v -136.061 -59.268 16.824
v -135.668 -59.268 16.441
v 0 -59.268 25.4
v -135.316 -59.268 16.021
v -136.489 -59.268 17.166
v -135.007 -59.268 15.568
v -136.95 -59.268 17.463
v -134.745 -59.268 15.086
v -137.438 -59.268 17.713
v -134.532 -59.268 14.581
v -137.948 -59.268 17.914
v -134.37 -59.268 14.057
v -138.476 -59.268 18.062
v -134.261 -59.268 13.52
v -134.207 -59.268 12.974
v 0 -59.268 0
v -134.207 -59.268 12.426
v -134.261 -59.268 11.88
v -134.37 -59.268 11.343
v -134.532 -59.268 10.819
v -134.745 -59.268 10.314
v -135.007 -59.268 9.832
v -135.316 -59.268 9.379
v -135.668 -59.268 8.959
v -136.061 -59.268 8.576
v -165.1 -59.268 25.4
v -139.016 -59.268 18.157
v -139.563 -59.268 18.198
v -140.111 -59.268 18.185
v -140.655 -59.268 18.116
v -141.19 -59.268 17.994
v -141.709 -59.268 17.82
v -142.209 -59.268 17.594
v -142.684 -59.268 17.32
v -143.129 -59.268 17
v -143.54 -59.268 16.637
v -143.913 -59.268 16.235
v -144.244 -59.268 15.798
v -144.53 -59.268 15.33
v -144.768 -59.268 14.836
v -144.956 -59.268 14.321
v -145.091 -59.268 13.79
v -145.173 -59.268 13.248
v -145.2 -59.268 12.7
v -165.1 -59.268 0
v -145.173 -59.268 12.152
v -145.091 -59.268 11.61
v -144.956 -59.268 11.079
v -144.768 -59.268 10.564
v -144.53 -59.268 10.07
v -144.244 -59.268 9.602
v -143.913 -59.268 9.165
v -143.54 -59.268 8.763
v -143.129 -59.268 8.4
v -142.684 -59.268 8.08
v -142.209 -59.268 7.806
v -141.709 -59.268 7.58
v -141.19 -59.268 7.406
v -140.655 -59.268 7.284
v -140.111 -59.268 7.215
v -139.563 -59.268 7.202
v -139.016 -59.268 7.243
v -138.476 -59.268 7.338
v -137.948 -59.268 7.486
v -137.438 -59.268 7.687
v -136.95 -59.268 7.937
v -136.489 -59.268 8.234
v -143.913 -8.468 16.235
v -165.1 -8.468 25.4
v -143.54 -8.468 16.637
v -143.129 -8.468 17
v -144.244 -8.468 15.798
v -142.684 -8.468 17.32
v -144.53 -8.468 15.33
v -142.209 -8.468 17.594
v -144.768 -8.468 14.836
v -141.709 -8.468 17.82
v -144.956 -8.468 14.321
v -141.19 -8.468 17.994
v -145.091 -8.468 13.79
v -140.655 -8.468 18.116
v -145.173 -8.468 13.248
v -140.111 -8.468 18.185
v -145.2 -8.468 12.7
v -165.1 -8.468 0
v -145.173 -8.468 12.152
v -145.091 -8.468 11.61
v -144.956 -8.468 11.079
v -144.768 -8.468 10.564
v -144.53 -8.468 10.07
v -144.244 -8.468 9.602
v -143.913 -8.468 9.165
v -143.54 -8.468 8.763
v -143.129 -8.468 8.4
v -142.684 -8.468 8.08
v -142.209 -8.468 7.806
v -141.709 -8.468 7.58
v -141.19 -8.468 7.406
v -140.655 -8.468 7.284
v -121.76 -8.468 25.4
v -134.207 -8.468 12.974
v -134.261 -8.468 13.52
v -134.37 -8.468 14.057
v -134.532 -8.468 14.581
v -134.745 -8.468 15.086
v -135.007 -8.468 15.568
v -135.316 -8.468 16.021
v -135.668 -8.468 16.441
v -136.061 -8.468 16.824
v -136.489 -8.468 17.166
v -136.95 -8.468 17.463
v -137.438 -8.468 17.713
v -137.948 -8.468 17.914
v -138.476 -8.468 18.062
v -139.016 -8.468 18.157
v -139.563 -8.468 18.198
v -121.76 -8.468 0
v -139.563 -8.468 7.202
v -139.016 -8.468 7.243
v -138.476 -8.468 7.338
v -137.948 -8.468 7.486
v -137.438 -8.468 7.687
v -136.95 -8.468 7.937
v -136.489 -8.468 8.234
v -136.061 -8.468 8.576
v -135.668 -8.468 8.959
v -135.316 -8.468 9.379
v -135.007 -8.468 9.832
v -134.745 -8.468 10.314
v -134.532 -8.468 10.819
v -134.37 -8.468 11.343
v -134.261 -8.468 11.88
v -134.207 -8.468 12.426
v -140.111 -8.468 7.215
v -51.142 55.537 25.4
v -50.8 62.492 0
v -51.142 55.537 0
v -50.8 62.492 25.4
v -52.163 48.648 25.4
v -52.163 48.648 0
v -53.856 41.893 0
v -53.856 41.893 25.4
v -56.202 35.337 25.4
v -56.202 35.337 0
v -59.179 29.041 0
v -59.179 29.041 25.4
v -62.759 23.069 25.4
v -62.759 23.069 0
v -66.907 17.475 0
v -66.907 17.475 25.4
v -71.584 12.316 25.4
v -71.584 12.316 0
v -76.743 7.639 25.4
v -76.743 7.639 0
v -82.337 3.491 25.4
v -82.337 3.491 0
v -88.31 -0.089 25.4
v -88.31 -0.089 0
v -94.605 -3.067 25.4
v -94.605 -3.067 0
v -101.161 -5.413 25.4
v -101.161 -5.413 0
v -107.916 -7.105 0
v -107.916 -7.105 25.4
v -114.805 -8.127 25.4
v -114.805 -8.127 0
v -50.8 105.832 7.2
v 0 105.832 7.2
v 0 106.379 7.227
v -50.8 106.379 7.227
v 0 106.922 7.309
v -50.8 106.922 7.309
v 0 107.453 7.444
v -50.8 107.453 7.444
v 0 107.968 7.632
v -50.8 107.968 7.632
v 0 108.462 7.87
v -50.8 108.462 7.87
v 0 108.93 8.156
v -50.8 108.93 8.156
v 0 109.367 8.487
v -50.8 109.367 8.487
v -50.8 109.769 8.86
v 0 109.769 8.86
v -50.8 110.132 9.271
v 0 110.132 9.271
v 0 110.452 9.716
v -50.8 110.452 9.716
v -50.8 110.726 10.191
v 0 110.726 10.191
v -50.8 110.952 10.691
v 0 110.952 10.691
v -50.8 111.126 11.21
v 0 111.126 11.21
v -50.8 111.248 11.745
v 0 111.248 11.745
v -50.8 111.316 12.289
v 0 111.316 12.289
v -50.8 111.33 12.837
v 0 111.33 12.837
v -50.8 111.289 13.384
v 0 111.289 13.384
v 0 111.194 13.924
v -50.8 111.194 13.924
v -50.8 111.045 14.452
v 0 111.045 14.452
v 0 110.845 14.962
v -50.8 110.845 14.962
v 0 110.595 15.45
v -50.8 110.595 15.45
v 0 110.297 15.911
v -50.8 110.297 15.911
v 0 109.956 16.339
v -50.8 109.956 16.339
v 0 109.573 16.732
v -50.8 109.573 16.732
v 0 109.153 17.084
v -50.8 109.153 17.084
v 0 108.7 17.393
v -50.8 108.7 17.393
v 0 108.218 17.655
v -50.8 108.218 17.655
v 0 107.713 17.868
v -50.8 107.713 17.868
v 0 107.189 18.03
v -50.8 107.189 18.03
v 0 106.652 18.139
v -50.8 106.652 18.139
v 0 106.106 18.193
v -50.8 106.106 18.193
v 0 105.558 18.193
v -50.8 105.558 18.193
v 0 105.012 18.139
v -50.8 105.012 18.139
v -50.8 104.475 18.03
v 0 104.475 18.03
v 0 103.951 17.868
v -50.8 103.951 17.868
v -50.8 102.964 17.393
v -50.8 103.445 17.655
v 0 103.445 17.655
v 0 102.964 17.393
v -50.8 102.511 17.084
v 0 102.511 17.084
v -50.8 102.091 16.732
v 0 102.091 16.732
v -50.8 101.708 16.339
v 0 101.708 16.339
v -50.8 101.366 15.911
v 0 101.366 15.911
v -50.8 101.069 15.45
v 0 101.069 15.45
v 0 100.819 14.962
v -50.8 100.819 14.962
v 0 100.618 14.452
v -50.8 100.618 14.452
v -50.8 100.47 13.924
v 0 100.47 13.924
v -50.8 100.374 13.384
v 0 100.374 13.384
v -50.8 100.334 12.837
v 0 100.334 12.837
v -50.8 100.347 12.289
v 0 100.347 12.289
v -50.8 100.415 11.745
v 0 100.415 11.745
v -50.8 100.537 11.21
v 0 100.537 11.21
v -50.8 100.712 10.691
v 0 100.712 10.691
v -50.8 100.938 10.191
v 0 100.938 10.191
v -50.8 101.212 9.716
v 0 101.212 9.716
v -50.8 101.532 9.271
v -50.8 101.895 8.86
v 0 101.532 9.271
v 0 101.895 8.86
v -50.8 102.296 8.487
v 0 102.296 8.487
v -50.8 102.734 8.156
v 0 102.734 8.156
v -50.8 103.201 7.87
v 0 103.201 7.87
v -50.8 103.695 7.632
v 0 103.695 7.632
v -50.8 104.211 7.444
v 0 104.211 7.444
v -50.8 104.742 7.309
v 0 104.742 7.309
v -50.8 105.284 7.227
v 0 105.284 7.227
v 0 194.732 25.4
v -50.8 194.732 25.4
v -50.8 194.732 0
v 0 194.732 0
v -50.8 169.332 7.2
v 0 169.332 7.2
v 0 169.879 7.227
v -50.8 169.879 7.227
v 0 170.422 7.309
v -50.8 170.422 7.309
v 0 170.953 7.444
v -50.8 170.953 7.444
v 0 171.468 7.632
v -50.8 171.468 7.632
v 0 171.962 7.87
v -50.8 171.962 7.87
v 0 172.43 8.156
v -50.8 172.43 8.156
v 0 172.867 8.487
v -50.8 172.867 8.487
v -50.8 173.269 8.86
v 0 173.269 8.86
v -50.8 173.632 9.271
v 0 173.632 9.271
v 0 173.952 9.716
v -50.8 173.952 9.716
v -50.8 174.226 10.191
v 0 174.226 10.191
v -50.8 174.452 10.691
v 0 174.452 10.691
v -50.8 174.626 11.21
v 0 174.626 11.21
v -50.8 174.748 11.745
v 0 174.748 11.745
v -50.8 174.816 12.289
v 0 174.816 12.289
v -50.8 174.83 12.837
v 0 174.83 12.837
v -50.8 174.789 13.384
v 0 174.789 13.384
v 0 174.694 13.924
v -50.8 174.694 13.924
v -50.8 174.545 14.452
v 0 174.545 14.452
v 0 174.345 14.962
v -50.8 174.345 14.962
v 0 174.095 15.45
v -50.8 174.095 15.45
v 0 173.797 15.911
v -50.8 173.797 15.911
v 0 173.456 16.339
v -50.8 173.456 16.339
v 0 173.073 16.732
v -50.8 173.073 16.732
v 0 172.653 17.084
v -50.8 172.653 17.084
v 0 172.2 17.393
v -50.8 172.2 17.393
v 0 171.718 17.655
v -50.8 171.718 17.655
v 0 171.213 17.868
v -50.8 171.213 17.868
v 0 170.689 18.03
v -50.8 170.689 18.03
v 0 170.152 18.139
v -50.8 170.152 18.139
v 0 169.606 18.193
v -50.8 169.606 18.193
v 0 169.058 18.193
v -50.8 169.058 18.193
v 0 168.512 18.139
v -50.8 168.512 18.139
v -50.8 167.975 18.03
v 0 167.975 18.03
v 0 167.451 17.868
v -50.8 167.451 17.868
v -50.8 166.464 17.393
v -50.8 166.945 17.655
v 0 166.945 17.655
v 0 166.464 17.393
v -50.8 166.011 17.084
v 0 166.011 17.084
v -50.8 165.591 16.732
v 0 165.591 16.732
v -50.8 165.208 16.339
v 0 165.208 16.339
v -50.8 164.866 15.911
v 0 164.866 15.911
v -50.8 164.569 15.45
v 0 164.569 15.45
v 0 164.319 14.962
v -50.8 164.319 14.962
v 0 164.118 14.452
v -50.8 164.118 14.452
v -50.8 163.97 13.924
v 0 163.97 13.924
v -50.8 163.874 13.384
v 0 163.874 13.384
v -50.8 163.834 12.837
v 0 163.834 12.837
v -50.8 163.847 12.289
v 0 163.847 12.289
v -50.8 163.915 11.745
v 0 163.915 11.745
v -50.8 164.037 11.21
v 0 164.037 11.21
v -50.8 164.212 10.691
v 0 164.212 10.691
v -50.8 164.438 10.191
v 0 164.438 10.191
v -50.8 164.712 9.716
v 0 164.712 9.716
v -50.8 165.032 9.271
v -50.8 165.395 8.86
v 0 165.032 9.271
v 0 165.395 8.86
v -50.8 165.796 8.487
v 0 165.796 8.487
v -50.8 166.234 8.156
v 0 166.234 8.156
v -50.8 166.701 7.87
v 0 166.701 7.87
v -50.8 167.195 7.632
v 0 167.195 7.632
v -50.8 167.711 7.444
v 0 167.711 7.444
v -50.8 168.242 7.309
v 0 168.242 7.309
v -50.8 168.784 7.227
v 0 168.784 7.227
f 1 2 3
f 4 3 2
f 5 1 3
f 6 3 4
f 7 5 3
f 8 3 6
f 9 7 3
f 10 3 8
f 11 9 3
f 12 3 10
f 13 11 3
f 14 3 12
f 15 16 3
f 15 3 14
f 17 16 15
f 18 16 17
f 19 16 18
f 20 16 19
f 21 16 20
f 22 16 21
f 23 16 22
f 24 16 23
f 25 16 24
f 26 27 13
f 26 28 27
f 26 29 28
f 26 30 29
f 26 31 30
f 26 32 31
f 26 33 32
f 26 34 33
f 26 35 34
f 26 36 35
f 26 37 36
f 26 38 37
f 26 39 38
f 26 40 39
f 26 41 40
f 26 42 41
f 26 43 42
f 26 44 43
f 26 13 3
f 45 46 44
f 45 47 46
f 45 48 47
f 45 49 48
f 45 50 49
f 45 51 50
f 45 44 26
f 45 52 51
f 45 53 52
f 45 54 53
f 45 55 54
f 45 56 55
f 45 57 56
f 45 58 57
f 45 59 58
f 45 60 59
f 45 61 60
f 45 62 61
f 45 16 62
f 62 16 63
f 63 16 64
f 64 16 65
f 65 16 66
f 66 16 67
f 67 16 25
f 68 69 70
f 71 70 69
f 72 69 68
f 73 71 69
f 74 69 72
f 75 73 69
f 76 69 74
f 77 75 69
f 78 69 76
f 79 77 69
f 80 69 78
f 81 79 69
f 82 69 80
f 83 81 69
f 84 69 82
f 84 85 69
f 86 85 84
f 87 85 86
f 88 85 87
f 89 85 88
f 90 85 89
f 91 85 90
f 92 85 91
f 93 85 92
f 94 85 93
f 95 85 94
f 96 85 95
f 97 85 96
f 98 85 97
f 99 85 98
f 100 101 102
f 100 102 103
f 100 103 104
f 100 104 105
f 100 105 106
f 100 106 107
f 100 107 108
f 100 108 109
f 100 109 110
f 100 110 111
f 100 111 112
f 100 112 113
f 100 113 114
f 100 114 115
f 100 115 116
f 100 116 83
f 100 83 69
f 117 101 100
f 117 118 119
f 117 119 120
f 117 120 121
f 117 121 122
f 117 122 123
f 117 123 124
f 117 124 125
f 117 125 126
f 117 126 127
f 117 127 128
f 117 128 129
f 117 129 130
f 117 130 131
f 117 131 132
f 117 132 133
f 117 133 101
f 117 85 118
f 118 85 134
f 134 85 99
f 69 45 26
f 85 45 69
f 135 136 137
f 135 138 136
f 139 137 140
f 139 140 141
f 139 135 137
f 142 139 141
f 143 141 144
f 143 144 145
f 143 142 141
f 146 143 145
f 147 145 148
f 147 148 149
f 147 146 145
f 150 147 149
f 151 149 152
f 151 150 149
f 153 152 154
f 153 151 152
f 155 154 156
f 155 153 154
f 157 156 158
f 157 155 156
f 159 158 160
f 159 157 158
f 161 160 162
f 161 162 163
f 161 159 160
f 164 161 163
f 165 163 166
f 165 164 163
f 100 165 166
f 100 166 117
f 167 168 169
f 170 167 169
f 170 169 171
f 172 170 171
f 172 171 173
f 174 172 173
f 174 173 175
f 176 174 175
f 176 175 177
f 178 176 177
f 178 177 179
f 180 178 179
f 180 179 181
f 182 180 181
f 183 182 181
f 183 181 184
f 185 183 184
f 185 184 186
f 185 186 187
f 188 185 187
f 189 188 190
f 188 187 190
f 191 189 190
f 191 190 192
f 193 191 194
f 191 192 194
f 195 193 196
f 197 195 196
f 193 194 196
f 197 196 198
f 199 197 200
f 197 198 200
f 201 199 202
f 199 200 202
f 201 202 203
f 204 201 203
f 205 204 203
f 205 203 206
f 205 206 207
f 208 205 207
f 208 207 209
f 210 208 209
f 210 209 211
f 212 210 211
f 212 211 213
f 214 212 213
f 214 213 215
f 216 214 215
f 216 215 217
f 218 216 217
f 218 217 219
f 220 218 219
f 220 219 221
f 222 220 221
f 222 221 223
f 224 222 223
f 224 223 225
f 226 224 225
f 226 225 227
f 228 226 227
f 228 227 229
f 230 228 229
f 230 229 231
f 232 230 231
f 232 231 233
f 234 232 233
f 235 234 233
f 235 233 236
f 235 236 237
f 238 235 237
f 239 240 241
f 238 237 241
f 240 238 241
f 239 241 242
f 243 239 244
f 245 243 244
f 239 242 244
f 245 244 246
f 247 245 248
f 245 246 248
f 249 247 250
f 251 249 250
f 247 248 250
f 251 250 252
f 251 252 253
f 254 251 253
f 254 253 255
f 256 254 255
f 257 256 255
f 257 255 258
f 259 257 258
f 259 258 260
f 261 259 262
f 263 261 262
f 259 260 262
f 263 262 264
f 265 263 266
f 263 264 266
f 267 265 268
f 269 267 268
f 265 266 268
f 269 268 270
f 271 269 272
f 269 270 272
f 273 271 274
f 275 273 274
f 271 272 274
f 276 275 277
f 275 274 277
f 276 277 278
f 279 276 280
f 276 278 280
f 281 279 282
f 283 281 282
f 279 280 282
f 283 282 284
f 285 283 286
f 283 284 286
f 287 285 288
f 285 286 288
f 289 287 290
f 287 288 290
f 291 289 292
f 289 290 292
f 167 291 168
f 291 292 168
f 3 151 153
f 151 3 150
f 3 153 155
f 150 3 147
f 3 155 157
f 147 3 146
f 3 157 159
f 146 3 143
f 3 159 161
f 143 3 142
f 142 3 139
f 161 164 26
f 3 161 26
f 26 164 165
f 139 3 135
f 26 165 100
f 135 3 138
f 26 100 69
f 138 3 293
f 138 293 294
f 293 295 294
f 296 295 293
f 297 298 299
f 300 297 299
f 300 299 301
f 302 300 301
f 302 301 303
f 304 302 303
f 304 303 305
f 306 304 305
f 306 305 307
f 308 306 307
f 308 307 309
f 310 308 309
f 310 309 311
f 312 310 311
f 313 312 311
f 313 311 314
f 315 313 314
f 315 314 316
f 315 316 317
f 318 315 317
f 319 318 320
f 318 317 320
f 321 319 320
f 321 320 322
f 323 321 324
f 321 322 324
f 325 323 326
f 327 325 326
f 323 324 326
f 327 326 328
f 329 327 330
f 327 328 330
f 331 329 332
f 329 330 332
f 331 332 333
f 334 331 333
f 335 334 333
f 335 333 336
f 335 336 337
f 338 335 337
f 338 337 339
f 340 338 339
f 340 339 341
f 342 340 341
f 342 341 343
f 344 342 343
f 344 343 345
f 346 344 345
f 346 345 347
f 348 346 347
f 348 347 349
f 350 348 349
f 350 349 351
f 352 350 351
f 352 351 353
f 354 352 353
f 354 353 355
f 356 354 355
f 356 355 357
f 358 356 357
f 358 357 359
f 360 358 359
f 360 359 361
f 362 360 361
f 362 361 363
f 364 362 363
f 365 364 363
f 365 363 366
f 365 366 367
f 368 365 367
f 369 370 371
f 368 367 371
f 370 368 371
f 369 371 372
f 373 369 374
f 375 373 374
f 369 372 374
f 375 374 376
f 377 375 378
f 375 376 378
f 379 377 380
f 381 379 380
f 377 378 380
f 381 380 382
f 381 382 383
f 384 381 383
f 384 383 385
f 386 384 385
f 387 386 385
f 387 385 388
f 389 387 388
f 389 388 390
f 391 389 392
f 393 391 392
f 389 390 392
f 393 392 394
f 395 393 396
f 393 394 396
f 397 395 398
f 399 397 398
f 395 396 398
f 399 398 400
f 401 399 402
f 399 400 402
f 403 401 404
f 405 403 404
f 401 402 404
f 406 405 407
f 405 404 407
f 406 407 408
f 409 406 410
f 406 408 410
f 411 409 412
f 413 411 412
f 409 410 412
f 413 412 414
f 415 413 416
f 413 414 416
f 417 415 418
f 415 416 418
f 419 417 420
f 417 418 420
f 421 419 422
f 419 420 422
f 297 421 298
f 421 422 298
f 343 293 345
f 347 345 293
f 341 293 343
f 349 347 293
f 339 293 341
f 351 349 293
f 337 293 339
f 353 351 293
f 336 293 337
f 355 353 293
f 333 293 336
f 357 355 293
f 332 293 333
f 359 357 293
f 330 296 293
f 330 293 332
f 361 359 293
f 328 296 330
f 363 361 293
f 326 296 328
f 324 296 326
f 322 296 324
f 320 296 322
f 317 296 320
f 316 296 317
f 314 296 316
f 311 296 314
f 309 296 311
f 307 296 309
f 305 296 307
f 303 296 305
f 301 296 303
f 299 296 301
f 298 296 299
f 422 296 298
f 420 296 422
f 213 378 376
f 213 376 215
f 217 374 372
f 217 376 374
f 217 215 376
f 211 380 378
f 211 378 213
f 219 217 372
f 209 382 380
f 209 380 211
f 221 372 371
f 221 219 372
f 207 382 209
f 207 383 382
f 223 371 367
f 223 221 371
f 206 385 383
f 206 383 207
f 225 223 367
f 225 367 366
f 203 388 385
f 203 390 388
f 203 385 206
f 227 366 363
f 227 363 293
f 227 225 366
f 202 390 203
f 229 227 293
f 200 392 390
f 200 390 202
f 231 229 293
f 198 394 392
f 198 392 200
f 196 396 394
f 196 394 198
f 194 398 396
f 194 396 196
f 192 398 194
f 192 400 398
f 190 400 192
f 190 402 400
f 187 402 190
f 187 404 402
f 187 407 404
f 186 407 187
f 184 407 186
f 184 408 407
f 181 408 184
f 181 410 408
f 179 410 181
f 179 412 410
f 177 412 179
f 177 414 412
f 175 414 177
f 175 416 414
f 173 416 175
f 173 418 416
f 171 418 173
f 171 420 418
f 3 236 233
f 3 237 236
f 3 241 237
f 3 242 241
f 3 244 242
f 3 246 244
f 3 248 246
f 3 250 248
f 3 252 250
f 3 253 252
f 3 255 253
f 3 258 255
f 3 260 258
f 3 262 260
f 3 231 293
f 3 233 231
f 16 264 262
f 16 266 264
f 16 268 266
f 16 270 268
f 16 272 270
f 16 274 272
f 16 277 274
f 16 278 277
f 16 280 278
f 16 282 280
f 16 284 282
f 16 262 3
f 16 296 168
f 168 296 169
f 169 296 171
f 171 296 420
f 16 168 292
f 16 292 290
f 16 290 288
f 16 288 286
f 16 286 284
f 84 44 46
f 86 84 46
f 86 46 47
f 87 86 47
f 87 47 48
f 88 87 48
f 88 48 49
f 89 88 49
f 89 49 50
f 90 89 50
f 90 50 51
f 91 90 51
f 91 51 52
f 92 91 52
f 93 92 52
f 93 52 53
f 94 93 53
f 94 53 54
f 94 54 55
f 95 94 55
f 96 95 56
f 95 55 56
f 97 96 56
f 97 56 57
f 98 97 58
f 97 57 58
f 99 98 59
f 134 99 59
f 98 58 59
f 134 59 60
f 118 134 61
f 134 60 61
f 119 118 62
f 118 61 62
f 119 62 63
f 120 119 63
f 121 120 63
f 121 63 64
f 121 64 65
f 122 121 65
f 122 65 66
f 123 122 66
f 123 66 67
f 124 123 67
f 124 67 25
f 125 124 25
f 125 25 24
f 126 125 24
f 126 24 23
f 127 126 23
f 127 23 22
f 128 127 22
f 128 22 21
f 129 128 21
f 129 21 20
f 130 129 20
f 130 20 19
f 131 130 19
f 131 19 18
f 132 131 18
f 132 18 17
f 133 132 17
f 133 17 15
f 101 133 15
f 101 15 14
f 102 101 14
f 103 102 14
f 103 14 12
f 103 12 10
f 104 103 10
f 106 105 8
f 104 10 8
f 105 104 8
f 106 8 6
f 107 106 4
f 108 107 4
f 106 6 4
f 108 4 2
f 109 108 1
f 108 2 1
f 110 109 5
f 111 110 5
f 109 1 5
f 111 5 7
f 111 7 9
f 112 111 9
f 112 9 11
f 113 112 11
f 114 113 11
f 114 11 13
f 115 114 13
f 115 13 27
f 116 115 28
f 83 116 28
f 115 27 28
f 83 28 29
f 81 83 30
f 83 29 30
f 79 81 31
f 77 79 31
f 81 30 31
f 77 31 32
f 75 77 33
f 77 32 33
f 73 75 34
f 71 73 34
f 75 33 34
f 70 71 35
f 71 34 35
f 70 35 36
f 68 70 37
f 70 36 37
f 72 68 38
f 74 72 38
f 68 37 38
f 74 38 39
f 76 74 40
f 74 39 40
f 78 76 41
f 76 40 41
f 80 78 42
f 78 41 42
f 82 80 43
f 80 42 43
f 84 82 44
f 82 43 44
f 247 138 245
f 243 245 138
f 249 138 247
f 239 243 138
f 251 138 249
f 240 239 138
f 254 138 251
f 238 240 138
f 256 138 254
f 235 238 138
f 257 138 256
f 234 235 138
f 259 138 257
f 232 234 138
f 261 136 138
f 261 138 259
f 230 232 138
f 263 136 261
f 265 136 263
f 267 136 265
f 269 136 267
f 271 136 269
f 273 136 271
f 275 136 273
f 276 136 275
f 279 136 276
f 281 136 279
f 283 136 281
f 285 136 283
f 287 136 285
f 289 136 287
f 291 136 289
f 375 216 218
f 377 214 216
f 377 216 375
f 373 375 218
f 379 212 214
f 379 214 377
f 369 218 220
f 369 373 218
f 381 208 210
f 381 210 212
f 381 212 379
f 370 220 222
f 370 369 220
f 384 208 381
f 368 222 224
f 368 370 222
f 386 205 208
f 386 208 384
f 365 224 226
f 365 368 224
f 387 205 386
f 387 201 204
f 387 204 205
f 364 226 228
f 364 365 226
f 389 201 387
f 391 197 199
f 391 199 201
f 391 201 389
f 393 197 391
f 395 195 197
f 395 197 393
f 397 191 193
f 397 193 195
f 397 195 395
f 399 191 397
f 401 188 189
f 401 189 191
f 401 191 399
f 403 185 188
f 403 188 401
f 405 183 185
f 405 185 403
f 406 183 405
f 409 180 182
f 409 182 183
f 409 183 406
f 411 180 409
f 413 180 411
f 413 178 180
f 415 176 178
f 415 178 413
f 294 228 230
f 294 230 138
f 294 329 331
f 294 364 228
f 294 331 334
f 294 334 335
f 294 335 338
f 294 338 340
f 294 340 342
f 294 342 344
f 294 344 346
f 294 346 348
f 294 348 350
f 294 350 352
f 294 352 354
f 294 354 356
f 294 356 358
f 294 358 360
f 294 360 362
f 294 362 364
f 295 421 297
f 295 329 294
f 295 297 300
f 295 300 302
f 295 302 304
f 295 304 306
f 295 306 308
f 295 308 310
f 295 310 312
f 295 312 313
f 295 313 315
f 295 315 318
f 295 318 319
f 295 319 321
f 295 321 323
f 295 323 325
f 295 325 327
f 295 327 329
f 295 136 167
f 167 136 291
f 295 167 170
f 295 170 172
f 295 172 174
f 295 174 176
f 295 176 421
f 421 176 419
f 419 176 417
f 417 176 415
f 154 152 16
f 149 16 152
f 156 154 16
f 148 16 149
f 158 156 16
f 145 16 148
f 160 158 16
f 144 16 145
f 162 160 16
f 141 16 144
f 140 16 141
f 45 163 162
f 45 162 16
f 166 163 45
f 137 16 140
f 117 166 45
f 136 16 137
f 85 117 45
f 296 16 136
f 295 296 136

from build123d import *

# Parameters (mm, degrees)
BOSS_EXTRUDE1_DEPTH   = 25.4
M10_CLEARANCE_HOLE1_D = 11
M10_CLEARANCE_HOLE2_D = 11
FILLET1_R             = 70.96


with BuildPart() as part:
    # Sketch1 → Boss-Extrude1 (new body)
    with BuildSketch(Plane.XY):
        Polygon((0, 194.731808123), (0, -59.268191877), (-165.1, -59.268191877), (-165.1, -8.468191877), (-50.8, -8.468191877), (-50.8, 194.731808123), align=None)
    extrude(amount=BOSS_EXTRUDE1_DEPTH)

    # M10 Clearance Hole1 (through all)
    with Locations(Plane(origin=(0, -8.468191877, 0), x_dir=(1, 0, 0), z_dir=(0, 1, 0))):
        with Locations((-139.7, -12.7)):
            Hole(M10_CLEARANCE_HOLE1_D / 2)

    # M10 Clearance Hole2 (through all)
    with Locations(Plane.ZY.offset(50.8)):
        with Locations((12.7, 169.331808123), (12.7, 105.831808123)):
            Hole(M10_CLEARANCE_HOLE2_D / 2)

    # Fillet1
    fillet1_edges = [part.edges().sort_by_distance(p)[0] for p in [
        (-50.8, -8.468191877, 12.7),
    ]]
    fillet(fillet1_edges, radius=FILLET1_R)


solid = part.part
